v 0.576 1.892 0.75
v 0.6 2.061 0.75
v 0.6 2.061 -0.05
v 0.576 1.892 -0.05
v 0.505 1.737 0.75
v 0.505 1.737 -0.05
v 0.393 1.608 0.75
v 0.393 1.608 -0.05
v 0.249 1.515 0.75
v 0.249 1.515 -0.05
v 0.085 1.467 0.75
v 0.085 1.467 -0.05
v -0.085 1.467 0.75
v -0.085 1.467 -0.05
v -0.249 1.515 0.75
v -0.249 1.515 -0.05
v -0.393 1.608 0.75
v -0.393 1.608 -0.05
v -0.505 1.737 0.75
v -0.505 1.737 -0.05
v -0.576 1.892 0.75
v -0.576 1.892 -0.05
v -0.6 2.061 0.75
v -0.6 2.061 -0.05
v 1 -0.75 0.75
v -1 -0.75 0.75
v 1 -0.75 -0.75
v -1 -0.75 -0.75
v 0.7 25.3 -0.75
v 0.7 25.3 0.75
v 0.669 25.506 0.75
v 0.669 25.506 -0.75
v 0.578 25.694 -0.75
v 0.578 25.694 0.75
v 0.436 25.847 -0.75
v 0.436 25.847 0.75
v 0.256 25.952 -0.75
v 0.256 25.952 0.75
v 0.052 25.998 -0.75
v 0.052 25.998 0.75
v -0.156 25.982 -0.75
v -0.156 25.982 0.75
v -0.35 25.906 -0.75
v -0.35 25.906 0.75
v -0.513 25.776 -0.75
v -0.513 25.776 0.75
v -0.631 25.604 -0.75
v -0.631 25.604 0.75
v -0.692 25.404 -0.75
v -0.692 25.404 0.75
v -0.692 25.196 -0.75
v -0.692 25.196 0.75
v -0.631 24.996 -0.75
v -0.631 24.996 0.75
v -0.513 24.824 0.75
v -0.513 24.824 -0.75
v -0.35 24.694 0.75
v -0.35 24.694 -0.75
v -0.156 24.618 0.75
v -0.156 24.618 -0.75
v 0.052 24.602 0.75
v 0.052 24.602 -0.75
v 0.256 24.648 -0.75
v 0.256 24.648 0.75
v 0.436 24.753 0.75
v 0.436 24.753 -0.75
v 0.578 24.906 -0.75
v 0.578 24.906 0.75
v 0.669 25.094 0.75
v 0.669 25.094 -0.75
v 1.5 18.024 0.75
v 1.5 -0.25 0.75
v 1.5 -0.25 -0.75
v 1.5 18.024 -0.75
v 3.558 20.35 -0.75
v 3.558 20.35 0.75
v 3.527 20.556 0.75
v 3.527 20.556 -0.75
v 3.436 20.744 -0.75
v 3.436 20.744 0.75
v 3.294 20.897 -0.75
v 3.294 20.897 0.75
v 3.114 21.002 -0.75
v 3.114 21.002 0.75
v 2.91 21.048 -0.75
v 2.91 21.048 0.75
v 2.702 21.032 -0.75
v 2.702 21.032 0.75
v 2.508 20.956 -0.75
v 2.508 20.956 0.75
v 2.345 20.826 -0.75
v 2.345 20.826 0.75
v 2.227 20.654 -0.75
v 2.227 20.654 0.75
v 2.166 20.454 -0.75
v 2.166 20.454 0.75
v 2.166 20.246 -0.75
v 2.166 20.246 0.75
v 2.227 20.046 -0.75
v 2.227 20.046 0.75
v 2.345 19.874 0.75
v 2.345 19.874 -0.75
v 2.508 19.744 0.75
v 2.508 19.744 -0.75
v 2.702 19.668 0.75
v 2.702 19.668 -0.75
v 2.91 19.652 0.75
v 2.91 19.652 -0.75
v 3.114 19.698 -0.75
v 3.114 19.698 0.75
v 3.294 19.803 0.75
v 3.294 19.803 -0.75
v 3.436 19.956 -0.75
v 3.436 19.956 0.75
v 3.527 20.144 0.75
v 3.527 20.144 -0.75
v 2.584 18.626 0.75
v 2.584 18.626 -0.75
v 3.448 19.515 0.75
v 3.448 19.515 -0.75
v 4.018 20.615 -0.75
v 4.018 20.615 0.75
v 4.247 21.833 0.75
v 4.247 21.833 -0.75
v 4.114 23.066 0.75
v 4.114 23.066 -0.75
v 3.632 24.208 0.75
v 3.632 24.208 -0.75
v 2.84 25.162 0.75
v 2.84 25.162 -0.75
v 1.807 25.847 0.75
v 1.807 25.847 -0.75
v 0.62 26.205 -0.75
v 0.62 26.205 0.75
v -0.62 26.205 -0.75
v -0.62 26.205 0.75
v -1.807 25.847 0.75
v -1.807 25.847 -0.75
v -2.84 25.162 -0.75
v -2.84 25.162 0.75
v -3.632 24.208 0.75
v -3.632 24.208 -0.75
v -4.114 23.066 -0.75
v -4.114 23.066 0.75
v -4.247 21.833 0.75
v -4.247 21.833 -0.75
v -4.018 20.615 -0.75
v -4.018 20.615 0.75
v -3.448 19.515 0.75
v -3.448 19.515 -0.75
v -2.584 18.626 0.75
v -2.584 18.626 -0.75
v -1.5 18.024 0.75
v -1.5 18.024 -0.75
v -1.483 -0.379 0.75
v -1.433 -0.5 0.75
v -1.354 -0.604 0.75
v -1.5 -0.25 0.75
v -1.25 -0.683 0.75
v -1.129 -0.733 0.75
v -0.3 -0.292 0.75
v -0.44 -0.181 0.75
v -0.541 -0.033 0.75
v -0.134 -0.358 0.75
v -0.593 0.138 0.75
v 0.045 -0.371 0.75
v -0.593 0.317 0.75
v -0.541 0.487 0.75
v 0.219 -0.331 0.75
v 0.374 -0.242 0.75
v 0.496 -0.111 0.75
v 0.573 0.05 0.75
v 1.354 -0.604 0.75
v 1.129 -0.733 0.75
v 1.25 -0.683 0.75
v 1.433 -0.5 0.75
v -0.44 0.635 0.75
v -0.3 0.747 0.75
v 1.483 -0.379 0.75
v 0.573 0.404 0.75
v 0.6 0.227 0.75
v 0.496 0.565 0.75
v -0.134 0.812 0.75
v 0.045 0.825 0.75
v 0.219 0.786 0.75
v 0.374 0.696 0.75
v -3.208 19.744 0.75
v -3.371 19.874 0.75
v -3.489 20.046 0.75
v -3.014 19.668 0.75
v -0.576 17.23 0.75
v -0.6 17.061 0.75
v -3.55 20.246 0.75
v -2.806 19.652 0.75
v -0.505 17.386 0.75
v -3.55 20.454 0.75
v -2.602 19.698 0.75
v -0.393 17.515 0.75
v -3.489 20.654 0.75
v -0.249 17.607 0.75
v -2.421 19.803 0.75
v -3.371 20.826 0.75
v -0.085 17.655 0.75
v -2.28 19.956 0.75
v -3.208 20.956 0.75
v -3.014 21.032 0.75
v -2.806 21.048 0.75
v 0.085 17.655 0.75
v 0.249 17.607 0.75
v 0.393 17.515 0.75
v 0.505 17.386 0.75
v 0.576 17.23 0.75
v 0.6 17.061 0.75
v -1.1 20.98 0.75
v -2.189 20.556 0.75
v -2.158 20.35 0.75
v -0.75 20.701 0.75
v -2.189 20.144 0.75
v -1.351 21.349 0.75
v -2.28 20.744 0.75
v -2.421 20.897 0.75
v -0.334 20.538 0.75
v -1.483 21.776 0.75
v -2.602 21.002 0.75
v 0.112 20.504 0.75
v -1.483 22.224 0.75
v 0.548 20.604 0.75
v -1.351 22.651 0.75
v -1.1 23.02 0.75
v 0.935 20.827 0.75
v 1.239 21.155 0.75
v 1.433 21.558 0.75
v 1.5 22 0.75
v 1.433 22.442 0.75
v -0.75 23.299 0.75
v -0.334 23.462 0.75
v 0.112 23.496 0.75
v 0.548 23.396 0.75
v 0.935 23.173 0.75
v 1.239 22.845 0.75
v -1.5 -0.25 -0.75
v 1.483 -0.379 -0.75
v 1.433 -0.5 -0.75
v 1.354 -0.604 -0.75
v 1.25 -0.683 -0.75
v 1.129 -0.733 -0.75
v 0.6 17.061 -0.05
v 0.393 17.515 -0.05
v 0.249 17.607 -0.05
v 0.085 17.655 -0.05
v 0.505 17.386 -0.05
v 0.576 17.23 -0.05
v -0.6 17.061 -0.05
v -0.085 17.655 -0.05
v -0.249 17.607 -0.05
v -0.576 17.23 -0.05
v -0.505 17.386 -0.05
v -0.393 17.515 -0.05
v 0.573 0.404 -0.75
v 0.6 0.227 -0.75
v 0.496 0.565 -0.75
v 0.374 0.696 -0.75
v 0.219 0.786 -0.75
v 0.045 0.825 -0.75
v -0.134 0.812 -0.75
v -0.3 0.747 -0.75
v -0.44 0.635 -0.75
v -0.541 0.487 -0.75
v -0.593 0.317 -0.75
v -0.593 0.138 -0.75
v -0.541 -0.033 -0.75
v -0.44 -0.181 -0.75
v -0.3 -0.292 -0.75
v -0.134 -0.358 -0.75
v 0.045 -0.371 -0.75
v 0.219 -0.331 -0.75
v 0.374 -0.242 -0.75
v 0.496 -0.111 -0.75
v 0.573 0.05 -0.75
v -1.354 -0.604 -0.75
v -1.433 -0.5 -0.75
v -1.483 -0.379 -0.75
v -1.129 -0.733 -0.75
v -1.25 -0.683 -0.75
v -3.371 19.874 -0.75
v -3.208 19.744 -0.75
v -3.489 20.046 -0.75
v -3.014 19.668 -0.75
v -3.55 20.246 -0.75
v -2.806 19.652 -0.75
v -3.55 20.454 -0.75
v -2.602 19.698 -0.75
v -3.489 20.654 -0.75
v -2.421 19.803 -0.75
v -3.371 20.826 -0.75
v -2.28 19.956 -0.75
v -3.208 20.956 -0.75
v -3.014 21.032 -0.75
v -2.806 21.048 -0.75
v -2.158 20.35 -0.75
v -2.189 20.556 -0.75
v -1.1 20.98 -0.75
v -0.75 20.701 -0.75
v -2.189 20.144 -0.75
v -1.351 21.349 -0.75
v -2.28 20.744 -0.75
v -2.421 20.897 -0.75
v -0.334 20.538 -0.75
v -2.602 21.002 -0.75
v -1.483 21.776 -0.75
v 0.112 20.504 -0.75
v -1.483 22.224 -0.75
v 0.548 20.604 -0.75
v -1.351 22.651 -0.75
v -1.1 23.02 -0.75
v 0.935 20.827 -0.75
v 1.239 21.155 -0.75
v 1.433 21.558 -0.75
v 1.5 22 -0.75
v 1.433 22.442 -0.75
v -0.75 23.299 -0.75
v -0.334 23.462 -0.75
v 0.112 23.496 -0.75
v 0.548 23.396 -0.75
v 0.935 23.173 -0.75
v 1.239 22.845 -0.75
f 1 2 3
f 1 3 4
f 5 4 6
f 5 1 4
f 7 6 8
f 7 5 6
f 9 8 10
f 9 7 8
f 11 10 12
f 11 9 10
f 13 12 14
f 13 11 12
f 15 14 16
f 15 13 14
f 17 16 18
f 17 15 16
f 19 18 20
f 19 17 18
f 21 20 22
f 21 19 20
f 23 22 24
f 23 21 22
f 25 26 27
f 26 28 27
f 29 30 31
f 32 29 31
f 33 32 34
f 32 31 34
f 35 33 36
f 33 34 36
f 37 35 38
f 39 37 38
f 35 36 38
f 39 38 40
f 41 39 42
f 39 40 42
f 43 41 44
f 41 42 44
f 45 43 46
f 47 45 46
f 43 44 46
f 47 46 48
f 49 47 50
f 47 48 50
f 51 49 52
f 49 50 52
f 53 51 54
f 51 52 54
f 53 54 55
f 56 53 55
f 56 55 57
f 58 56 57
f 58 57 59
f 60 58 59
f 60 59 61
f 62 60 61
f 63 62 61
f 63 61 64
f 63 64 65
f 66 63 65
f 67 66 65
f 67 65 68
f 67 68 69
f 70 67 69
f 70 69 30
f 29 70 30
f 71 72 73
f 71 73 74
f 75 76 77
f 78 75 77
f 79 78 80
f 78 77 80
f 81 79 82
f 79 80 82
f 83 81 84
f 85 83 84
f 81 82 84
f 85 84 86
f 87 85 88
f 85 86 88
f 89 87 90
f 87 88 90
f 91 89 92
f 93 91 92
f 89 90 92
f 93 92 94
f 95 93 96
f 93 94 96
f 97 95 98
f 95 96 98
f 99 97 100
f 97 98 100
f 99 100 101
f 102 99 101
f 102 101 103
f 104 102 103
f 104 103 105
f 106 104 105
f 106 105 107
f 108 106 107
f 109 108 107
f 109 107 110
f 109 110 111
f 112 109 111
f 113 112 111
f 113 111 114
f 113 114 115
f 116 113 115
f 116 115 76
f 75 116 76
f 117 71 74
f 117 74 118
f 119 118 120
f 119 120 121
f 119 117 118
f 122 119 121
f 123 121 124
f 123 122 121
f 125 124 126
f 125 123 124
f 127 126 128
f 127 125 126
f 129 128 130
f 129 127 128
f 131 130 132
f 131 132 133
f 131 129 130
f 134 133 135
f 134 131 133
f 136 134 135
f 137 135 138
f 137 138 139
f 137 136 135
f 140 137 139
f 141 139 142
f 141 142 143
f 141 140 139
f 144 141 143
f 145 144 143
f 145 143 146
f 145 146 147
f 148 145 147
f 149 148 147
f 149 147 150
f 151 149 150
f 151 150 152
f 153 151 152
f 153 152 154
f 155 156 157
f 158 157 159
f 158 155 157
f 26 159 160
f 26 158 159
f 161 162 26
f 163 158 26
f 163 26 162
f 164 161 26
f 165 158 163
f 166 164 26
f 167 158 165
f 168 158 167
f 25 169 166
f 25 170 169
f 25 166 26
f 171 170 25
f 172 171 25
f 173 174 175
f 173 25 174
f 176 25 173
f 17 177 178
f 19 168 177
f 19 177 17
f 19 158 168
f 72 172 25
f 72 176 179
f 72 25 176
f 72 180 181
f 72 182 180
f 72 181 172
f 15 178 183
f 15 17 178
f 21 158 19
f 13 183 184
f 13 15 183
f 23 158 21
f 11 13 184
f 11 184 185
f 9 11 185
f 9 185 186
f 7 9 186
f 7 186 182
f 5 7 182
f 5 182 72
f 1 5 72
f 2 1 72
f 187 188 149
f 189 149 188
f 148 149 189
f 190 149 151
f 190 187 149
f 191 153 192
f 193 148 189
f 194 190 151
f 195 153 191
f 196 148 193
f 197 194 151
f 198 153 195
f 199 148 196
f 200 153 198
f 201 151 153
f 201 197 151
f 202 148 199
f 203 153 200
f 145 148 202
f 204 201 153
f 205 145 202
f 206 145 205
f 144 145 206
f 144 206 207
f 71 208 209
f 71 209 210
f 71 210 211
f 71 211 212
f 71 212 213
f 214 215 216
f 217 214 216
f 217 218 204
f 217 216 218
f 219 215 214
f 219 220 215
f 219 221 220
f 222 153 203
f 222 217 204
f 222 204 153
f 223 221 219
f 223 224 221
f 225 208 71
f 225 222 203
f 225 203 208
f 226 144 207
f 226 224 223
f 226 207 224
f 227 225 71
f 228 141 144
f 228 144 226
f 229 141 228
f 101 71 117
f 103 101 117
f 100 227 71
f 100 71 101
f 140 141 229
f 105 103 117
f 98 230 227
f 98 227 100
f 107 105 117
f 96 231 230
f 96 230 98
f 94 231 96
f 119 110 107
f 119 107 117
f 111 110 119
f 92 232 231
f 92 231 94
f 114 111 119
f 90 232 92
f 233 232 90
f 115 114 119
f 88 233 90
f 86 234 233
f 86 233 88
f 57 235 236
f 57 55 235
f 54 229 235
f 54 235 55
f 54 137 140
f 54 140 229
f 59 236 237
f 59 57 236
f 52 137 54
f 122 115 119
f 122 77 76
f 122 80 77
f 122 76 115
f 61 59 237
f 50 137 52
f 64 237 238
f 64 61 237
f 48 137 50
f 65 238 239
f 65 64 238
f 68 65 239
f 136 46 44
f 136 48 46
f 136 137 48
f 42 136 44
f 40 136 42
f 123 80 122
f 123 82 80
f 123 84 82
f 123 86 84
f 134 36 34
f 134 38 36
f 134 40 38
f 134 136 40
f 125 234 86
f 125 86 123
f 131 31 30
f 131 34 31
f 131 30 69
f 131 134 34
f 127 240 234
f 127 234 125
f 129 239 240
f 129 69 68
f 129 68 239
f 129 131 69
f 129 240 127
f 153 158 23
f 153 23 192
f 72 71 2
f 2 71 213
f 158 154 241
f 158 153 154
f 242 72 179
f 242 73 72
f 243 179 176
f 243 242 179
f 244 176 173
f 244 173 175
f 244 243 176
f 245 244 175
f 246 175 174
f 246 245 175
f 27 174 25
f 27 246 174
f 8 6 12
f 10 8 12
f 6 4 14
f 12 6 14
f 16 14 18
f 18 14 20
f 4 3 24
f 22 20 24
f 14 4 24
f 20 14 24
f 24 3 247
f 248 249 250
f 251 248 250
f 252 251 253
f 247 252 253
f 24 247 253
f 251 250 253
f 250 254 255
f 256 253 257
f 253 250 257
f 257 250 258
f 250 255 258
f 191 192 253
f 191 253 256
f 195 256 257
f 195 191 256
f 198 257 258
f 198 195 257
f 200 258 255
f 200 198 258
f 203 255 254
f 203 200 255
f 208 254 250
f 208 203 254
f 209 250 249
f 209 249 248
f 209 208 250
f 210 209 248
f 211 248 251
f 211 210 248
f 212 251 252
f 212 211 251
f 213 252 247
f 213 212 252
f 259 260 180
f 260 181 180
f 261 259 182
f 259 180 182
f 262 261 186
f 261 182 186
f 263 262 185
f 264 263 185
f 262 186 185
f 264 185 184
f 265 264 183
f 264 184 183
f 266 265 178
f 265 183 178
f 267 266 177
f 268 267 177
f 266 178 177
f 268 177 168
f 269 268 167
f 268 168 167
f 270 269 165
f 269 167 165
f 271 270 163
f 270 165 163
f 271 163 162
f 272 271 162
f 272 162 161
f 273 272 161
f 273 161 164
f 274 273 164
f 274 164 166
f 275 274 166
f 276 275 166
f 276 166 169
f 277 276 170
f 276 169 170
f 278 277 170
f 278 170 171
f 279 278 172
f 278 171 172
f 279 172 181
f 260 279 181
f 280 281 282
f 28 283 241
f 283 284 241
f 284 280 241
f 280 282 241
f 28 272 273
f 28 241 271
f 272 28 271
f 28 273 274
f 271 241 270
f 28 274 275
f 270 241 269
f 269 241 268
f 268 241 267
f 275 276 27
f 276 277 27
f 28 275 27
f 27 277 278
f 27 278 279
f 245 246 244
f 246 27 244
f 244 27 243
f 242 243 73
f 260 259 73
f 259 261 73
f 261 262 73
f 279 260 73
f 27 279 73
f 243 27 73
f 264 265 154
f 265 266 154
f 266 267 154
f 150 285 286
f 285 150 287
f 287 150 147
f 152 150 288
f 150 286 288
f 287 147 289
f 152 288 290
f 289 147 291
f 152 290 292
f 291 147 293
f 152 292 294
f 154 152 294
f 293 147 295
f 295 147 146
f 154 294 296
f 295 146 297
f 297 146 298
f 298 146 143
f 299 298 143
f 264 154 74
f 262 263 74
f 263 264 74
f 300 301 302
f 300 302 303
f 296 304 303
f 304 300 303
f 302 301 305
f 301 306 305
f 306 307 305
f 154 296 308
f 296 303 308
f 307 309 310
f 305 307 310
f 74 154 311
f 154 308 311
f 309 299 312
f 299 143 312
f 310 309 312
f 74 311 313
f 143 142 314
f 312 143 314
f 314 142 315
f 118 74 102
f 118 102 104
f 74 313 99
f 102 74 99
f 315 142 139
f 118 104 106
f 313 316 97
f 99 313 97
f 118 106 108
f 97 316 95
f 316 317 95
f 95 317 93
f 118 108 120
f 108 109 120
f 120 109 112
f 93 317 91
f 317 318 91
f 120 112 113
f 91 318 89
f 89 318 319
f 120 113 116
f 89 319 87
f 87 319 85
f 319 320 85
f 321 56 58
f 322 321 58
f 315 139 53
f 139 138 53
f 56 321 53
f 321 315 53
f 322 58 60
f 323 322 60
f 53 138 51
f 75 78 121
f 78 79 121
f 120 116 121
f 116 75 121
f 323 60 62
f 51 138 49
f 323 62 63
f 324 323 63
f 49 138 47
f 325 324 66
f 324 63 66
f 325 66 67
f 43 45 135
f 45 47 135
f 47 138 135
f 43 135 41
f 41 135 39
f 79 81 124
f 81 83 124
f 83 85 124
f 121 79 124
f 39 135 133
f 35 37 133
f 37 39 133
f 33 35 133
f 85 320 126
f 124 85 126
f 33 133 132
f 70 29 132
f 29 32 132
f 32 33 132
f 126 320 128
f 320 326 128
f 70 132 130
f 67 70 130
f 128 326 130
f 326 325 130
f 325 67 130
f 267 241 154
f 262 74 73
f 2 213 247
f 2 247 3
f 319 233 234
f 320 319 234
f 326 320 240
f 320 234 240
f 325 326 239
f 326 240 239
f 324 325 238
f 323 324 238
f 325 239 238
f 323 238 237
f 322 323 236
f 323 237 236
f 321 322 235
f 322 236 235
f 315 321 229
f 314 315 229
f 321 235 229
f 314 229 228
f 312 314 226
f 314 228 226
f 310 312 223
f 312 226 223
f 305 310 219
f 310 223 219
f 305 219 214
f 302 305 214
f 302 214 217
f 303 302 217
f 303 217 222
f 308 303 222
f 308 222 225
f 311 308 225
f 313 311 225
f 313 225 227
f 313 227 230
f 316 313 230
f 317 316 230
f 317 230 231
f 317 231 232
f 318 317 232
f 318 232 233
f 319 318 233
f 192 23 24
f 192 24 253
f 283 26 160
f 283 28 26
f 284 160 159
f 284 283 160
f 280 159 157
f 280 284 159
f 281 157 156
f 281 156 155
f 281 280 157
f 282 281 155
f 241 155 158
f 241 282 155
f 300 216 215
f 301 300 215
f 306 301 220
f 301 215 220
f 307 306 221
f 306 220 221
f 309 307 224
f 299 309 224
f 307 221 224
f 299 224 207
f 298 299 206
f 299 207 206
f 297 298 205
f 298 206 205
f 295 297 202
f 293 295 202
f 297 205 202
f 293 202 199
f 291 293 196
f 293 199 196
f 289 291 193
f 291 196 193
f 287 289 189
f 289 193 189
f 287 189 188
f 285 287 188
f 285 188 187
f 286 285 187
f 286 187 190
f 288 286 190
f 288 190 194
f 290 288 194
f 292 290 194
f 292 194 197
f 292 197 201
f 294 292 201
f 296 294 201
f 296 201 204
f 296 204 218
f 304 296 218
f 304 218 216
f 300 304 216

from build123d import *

# Parameters (mm, degrees)
SKETCH1_W           = 3
SKETCH1_H           = 1.5
BOSS_EXTRUDE1_DEPTH = 0.75
BOSS_EXTRUDE2_DEPTH = 0.75
SKETCH4_R           = 1.5
SKETCH4_R_2         = 0.7
CUT_EXTRUDE1_DEPTH  = 27.634094691
CUT_EXTRUDE2_DEPTH  = 0.8
FILLET1_R           = 0.5
SKETCH7_R           = 0.6
CUT_EXTRUDE4_DEPTH  = 4


with BuildPart() as part:
    # Sketch1 → Boss-Extrude1 (new, symmetric)
    with BuildSketch(Plane(origin=(0, 0, 0), x_dir=(1, 0, 0), z_dir=(0, 1, 0))):
        Rectangle(SKETCH1_W, SKETCH1_H)
    extrude(amount=BOSS_EXTRUDE1_DEPTH, both=True)

    # Sketch2 → Boss-Extrude2 (add, symmetric)
    with BuildSketch(Plane.XY):
        with BuildLine():
            Line((1.5, 0), (1.5, 18.02350657))
            ThreePointArc((1.5, 18.02350657), (0, 26.25), (-1.5, 18.02350657))
            Line((-1.5, 18.02350657), (-1.5, 0))
            Line((-1.5, 0), (1.5, 0))
        make_face()
    extrude(amount=BOSS_EXTRUDE2_DEPTH, both=True)

    # Sketch4 → Cut-Extrude1 (cut, through all)
    with BuildSketch(Plane.XY.offset(0.75)):
        with Locations((0, 22)):
            Circle(SKETCH4_R)
        with Locations((0, 25.3)):
            Circle(SKETCH4_R_2)
        with Locations((2.857883832, 20.35)):
            Circle(SKETCH4_R_2)
        with Locations((-2.857883832, 20.35)):
            Circle(SKETCH4_R_2)
    extrude(amount=-CUT_EXTRUDE1_DEPTH, mode=Mode.SUBTRACT)

    # Sketch5 → Cut-Extrude2 (cut)
    with BuildSketch(Plane.XY.offset(0.75)):
        with BuildLine():
            Line((0.6, 17.061134616), (0.6, 2.061134616))
            ThreePointArc((0.6, 2.061134616), (0, 1.461134616), (-0.6, 2.061134616))
            Line((-0.6, 2.061134616), (-0.6, 17.061134616))
            ThreePointArc((-0.6, 17.061134616), (0, 17.661134616), (0.6, 17.061134616))
        make_face()
    extrude(amount=-CUT_EXTRUDE2_DEPTH, mode=Mode.SUBTRACT)

    # Fillet1
    fillet1_edges = [part.edges().sort_by_distance(p)[0] for p in [
        (-1.5, -0.75, 0),
        (1.5, -0.75, 0),
    ]]
    fillet(fillet1_edges, radius=FILLET1_R)

    # Sketch7 → Cut-Extrude4 (cut, symmetric)
    with BuildSketch(Plane.XY):
        with Locations((0, 0.227167564)):
            Circle(SKETCH7_R)
    extrude(amount=CUT_EXTRUDE4_DEPTH, both=True, mode=Mode.SUBTRACT)


solid = part.part
